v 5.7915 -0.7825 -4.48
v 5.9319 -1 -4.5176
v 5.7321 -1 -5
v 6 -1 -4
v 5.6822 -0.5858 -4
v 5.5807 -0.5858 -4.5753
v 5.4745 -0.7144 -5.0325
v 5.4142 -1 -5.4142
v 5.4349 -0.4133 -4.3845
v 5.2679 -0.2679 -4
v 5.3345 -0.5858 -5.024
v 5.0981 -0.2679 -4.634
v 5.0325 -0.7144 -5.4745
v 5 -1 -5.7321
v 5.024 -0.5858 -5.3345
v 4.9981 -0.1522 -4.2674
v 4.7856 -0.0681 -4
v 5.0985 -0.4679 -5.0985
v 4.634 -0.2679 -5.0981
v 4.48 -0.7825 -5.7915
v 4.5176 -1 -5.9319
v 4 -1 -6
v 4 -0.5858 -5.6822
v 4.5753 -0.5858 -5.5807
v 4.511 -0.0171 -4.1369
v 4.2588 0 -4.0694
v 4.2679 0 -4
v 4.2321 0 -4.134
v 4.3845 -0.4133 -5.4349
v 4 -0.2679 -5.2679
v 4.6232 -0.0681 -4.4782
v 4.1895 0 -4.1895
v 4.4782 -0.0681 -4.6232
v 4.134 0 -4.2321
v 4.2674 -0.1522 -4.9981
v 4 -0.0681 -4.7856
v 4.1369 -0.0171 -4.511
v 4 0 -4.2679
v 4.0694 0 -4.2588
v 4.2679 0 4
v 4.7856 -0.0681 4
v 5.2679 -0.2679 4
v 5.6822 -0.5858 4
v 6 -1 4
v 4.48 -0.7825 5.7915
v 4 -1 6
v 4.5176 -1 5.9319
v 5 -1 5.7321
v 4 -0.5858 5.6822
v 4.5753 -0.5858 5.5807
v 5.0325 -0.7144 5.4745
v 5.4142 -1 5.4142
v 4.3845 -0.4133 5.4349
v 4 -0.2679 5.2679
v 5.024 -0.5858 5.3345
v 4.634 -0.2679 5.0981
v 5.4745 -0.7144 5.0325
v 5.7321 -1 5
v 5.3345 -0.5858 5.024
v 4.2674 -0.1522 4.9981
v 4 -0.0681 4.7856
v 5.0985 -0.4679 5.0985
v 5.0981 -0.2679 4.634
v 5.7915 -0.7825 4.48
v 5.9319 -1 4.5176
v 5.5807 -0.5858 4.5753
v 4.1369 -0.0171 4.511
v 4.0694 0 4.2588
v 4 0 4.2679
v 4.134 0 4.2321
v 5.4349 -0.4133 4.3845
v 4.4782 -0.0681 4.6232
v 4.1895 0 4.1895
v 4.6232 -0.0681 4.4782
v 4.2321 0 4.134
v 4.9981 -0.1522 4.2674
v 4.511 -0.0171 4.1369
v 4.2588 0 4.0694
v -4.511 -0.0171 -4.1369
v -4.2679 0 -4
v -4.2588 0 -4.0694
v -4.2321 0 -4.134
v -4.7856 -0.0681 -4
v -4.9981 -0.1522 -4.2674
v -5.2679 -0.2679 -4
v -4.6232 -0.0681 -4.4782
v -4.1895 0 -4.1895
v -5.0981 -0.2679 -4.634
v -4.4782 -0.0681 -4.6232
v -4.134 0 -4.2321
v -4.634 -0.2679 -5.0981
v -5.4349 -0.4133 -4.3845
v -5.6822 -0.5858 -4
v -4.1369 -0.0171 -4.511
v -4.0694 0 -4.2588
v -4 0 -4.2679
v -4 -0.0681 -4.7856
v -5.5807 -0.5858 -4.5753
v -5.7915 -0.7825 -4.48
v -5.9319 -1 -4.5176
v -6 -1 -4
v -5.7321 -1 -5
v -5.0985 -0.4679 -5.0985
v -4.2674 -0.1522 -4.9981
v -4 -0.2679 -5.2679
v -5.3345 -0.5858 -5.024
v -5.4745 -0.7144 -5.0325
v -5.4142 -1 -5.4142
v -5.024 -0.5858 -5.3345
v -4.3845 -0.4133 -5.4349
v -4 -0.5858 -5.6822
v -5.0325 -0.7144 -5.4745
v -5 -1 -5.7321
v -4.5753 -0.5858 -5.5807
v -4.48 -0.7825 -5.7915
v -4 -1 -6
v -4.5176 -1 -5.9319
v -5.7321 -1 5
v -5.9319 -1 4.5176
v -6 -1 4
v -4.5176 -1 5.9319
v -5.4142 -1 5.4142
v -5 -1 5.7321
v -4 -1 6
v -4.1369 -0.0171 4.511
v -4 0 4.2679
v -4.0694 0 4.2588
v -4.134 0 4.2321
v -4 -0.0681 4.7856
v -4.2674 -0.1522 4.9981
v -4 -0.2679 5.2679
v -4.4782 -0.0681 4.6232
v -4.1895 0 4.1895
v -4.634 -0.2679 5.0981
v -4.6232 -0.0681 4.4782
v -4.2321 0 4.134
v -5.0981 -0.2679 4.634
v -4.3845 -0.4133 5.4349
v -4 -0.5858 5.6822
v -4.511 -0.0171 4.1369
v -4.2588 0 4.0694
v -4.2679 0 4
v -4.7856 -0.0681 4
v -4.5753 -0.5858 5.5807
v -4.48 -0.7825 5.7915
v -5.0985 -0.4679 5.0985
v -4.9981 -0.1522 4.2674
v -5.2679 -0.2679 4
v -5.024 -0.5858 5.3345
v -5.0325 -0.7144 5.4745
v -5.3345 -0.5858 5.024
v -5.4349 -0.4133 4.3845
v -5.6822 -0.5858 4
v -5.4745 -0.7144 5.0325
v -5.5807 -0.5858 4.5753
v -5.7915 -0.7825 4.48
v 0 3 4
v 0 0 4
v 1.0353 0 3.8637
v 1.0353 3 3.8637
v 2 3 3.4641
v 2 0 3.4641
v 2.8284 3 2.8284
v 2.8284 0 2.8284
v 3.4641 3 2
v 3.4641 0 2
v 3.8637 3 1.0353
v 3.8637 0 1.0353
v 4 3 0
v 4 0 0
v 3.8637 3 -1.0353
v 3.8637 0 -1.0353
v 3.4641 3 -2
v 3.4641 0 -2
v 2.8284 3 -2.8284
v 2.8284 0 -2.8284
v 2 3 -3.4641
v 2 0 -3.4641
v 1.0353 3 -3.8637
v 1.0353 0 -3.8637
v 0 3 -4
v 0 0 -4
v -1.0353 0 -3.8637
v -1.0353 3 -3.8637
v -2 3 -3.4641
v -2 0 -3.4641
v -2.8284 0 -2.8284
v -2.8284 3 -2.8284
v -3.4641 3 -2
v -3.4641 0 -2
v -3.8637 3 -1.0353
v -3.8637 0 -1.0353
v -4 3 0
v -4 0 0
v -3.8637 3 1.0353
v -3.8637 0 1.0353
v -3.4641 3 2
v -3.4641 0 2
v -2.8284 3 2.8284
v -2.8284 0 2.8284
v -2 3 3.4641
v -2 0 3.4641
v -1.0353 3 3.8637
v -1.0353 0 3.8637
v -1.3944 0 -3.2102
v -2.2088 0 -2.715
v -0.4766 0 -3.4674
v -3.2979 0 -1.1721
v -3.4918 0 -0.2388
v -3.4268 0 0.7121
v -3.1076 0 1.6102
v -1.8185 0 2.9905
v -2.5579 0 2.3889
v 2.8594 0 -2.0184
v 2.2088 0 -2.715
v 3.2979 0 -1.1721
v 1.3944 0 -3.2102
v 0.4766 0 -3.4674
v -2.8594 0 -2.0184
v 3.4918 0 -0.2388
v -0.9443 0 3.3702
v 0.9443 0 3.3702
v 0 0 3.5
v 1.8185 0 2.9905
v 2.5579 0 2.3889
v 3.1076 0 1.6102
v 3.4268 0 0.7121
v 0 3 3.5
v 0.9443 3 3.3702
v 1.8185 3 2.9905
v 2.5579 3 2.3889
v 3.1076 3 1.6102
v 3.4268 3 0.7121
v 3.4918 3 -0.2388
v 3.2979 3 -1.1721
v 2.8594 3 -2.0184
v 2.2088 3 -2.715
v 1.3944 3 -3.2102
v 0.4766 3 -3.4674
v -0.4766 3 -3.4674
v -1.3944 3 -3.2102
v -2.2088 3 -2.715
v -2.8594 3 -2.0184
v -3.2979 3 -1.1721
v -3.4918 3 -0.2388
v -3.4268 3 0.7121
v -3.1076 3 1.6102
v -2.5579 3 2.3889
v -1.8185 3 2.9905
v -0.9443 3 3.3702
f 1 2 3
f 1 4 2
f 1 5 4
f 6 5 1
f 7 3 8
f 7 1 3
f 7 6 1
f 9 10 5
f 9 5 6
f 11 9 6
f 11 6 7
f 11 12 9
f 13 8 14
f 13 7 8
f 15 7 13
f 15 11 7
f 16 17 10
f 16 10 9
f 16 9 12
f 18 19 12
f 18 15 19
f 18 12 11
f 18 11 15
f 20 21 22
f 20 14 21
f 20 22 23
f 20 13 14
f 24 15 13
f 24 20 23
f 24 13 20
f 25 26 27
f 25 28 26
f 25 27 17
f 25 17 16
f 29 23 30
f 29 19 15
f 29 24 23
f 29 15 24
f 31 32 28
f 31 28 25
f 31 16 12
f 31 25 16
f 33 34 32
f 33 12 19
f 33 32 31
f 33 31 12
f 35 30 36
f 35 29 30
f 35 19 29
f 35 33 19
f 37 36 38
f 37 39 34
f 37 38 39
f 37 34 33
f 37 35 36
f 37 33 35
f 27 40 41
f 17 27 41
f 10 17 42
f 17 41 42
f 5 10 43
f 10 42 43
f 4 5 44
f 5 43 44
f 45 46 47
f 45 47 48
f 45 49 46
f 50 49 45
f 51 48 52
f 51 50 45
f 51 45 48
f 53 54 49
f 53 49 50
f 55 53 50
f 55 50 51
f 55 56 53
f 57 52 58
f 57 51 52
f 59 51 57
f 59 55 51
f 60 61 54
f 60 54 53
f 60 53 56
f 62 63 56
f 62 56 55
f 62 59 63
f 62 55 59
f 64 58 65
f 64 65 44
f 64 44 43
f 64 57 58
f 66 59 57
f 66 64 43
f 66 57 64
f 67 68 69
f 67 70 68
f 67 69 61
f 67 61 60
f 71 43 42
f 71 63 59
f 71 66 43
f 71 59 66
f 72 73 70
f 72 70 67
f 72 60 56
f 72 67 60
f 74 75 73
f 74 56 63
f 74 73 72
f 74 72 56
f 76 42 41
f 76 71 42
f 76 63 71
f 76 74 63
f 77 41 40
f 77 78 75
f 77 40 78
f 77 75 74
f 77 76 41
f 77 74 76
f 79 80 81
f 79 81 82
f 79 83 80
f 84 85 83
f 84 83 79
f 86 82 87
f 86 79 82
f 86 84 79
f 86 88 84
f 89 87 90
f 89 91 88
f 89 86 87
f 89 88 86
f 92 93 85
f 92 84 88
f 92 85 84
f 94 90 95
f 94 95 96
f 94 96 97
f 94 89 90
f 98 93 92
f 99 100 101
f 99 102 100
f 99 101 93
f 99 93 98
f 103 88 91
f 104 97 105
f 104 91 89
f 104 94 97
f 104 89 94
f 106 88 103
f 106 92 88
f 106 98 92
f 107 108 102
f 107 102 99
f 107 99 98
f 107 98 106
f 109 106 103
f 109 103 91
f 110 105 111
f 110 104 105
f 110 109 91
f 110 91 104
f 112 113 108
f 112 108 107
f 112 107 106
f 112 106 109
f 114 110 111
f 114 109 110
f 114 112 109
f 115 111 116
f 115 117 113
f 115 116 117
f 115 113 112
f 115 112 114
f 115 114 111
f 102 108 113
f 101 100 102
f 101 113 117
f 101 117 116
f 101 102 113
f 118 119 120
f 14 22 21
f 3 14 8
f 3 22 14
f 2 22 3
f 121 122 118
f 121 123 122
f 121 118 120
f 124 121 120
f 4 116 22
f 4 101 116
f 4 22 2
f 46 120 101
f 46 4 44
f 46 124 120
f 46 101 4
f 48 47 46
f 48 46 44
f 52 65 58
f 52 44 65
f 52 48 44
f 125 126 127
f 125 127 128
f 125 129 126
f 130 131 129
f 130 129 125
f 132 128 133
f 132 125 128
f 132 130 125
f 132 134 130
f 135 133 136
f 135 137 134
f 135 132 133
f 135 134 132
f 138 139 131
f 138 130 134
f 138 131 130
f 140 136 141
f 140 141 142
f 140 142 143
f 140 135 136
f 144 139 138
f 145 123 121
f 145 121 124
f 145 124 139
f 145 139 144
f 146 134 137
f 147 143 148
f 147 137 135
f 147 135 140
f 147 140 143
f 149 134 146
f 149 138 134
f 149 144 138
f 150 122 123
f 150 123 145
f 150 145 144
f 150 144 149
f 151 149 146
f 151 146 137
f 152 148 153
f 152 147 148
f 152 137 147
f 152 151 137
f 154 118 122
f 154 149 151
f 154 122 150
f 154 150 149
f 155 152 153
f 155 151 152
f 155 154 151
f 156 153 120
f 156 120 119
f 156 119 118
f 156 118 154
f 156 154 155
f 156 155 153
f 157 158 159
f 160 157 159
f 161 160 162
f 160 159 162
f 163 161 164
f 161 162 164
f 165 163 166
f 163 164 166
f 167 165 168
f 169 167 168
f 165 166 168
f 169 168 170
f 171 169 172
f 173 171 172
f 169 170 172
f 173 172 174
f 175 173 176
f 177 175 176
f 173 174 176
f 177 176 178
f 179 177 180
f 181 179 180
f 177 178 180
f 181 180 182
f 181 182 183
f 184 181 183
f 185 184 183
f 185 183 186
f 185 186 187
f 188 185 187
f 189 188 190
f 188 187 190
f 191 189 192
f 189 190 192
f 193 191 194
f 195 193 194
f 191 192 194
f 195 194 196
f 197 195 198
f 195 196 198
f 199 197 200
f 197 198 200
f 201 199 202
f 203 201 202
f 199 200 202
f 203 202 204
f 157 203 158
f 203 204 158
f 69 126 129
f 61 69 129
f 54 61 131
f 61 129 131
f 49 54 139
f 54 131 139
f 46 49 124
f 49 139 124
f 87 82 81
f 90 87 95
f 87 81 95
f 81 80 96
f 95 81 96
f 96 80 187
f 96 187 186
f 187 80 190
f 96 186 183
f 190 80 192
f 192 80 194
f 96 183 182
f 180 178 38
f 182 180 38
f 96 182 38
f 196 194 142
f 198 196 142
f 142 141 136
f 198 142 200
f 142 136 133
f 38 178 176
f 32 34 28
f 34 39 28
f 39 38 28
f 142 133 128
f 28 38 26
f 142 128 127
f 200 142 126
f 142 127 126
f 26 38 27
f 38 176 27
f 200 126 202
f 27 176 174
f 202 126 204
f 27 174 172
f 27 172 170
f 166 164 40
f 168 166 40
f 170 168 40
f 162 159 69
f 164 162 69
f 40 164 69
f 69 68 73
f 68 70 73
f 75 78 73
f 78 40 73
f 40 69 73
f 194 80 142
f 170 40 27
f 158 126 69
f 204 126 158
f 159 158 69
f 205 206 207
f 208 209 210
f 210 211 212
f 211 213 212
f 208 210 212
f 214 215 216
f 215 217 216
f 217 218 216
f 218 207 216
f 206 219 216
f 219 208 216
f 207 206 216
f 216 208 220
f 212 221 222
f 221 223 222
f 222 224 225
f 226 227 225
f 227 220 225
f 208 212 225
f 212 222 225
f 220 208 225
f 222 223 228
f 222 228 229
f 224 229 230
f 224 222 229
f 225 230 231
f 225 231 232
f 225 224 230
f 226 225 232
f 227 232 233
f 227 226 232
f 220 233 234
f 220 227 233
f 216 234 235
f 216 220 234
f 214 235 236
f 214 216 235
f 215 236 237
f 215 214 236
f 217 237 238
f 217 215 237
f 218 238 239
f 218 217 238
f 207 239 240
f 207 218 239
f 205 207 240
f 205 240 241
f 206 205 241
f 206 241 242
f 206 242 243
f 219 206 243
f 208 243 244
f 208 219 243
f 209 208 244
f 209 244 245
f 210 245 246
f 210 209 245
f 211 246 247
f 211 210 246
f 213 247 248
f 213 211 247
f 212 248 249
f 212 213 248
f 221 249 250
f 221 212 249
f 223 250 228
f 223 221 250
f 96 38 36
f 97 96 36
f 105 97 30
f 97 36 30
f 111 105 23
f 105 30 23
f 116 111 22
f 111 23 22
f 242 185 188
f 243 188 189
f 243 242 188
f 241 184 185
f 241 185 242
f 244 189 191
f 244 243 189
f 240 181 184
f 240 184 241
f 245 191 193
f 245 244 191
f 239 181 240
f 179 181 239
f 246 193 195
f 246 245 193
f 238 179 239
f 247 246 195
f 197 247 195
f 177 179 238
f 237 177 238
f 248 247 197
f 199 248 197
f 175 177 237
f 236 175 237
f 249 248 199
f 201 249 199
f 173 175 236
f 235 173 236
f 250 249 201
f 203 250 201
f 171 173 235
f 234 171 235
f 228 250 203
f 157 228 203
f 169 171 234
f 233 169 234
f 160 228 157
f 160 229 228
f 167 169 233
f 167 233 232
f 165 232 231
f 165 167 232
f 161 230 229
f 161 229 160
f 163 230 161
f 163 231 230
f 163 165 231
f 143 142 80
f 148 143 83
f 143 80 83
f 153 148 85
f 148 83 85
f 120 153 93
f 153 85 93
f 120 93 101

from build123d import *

# Parameters (mm, degrees)
SKETCH1_R           = 4
SKETCH1_R_2         = 3.5
BOSS_EXTRUDE1_DEPTH = 3
SKETCH2_W           = 12
SKETCH2_H           = 12
BOSS_EXTRUDE2_DEPTH = 1
FILLET10_R          = 2
FILLET11_R          = 2


with BuildPart() as part:
    # Sketch1 → Boss-Extrude1 (new body)
    with BuildSketch(Plane(origin=(0, 0, 0), x_dir=(1, 0, 0), z_dir=(0, 1, 0))):
        with Locations(Location((0, 0, 0), (0, 0, 270))):
            Circle(SKETCH1_R)
        with Locations(Location((0, 0, 0), (0, 0, 270))):
            Circle(SKETCH1_R_2, mode=Mode.SUBTRACT)
    extrude(amount=BOSS_EXTRUDE1_DEPTH)

    # Sketch2 → Boss-Extrude2 (add)
    with BuildSketch(Plane.XZ):
        Rectangle(SKETCH2_W, SKETCH2_H)
    extrude(amount=BOSS_EXTRUDE2_DEPTH)

    # Fillet10
    fillet10_edges = [part.edges().sort_by_distance(p)[0] for p in [
        (6, -0.5, -6),
        (6, -0.5, 6),
        (-6, -0.5, 6),
        (-6, -0.5, -6),
    ]]
    fillet(fillet10_edges, radius=FILLET10_R)

    # Fillet11
    # the kernel refuses this fillet: 2 mm, written as the material it takes off along each edge
    with BuildSketch(Plane(origin=(-4, 0, 4), x_dir=(0, 0, 1), z_dir=(1, 0, 0))) as fillet11_piece_1:
        with BuildLine():
            CenterArc((0.267949192, 2), FILLET11_R, 270, 60)
            Line((2, 1), (2.034641016, 0.98))
            ThreePointArc((2.034641016, 0.98), (2.04, 0.5), (2.04, 0))
            Line((2.04, 0), (2, -0.04))
            Line((2, -0.04), (0.267949192, -0.04))
            Line((0.267949192, -0.04), (0.267949192, 0))
        make_face()
    revolve(axis=Axis((-4, 0, 4), (0, -1, 0)), revolution_arc=90, mode=Mode.SUBTRACT)
    with BuildSketch(Plane(origin=(-4, 0, 6), x_dir=(0, -1, 0), z_dir=(1, 0, 0))) as fillet11_piece_2:
        with BuildLine():
            CenterArc((2, 1.732050808), FILLET11_R, 180, 60)
            Line((0, 1.732050808), (-0.04, 1.732050808))
            Line((-0.04, 1.732050808), (-0.04, 0))
            Line((-0.04, 0), (0, -0.04))
            ThreePointArc((0, -0.04), (0.5, -0.04), (0.98, -0.034641016))
            Line((0.98, -0.034641016), (1, 0))
        make_face()
    extrude(amount=8, mode=Mode.SUBTRACT)
    with BuildSketch(Plane(origin=(4, 0, 4), x_dir=(0, 0, 1), z_dir=(-1, 0, 0))) as fillet11_piece_3:
        with BuildLine():
            CenterArc((0.267949192, -2), FILLET11_R, 30, 60)
            Line((2, -1), (2.034641016, -0.98))
            ThreePointArc((2.034641016, -0.98), (2.04, -0.5), (2.04, 0))
            Line((2.04, 0), (2, 0.04))
            Line((2, 0.04), (0.267949192, 0.04))
            Line((0.267949192, 0.04), (0.267949192, 0))
        make_face()
    revolve(axis=Axis((4, 0, 4), (0, 1, 0)), revolution_arc=90, mode=Mode.SUBTRACT)
    with BuildSketch(Plane(origin=(4, 0, -4), x_dir=(1, 0, 0), z_dir=(0, 0, 1))) as fillet11_piece_4:
        with BuildLine():
            CenterArc((0.267949192, -2), FILLET11_R, 30, 60)
            Line((2, -1), (2.034641016, -0.98))
            ThreePointArc((2.034641016, -0.98), (2.04, -0.5), (2.04, 0))
            Line((2.04, 0), (2, 0.04))
            Line((2, 0.04), (0.267949192, 0.04))
            Line((0.267949192, 0.04), (0.267949192, 0))
        make_face()
    revolve(axis=Axis((4, 0, -4), (0, 1, 0)), revolution_arc=90, mode=Mode.SUBTRACT)
    with BuildSketch(Plane(origin=(4, 0, -6), x_dir=(0, 0, 1), z_dir=(-1, 0, 0)), Plane(origin=(6, 0, 4), x_dir=(-1, 0, 0), z_dir=(0, 0, -1)), Plane(origin=(-6, 0, -4), x_dir=(1, 0, 0), z_dir=(0, 0, 1))) as fillet11_piece_5:
        with BuildLine():
            CenterArc((1.732050808, -2), FILLET11_R, 90, 60)
            Line((0, -1), (-0.034641016, -0.98))
            ThreePointArc((-0.034641016, -0.98), (-0.04, -0.5), (-0.04, 0))
            Line((-0.04, 0), (0, 0.04))
            Line((0, 0.04), (1.732050808, 0.04))
            Line((1.732050808, 0.04), (1.732050808, 0))
        make_face()
    extrude(amount=8, mode=Mode.SUBTRACT)
    with BuildSketch(Plane(origin=(-4, 0, -4), x_dir=(-1, 0, 0), z_dir=(0, 0, 1))) as fillet11_piece_6:
        with BuildLine():
            CenterArc((0.267949192, 2), FILLET11_R, 270, 60)
            Line((2, 1), (2.034641016, 0.98))
            ThreePointArc((2.034641016, 0.98), (2.04, 0.5), (2.04, 0))
            Line((2.04, 0), (2, -0.04))
            Line((2, -0.04), (0.267949192, -0.04))
            Line((0.267949192, -0.04), (0.267949192, 0))
        make_face()
    revolve(axis=Axis((-4, 0, -4), (0, -1, 0)), revolution_arc=90, mode=Mode.SUBTRACT)


solid = part.part
